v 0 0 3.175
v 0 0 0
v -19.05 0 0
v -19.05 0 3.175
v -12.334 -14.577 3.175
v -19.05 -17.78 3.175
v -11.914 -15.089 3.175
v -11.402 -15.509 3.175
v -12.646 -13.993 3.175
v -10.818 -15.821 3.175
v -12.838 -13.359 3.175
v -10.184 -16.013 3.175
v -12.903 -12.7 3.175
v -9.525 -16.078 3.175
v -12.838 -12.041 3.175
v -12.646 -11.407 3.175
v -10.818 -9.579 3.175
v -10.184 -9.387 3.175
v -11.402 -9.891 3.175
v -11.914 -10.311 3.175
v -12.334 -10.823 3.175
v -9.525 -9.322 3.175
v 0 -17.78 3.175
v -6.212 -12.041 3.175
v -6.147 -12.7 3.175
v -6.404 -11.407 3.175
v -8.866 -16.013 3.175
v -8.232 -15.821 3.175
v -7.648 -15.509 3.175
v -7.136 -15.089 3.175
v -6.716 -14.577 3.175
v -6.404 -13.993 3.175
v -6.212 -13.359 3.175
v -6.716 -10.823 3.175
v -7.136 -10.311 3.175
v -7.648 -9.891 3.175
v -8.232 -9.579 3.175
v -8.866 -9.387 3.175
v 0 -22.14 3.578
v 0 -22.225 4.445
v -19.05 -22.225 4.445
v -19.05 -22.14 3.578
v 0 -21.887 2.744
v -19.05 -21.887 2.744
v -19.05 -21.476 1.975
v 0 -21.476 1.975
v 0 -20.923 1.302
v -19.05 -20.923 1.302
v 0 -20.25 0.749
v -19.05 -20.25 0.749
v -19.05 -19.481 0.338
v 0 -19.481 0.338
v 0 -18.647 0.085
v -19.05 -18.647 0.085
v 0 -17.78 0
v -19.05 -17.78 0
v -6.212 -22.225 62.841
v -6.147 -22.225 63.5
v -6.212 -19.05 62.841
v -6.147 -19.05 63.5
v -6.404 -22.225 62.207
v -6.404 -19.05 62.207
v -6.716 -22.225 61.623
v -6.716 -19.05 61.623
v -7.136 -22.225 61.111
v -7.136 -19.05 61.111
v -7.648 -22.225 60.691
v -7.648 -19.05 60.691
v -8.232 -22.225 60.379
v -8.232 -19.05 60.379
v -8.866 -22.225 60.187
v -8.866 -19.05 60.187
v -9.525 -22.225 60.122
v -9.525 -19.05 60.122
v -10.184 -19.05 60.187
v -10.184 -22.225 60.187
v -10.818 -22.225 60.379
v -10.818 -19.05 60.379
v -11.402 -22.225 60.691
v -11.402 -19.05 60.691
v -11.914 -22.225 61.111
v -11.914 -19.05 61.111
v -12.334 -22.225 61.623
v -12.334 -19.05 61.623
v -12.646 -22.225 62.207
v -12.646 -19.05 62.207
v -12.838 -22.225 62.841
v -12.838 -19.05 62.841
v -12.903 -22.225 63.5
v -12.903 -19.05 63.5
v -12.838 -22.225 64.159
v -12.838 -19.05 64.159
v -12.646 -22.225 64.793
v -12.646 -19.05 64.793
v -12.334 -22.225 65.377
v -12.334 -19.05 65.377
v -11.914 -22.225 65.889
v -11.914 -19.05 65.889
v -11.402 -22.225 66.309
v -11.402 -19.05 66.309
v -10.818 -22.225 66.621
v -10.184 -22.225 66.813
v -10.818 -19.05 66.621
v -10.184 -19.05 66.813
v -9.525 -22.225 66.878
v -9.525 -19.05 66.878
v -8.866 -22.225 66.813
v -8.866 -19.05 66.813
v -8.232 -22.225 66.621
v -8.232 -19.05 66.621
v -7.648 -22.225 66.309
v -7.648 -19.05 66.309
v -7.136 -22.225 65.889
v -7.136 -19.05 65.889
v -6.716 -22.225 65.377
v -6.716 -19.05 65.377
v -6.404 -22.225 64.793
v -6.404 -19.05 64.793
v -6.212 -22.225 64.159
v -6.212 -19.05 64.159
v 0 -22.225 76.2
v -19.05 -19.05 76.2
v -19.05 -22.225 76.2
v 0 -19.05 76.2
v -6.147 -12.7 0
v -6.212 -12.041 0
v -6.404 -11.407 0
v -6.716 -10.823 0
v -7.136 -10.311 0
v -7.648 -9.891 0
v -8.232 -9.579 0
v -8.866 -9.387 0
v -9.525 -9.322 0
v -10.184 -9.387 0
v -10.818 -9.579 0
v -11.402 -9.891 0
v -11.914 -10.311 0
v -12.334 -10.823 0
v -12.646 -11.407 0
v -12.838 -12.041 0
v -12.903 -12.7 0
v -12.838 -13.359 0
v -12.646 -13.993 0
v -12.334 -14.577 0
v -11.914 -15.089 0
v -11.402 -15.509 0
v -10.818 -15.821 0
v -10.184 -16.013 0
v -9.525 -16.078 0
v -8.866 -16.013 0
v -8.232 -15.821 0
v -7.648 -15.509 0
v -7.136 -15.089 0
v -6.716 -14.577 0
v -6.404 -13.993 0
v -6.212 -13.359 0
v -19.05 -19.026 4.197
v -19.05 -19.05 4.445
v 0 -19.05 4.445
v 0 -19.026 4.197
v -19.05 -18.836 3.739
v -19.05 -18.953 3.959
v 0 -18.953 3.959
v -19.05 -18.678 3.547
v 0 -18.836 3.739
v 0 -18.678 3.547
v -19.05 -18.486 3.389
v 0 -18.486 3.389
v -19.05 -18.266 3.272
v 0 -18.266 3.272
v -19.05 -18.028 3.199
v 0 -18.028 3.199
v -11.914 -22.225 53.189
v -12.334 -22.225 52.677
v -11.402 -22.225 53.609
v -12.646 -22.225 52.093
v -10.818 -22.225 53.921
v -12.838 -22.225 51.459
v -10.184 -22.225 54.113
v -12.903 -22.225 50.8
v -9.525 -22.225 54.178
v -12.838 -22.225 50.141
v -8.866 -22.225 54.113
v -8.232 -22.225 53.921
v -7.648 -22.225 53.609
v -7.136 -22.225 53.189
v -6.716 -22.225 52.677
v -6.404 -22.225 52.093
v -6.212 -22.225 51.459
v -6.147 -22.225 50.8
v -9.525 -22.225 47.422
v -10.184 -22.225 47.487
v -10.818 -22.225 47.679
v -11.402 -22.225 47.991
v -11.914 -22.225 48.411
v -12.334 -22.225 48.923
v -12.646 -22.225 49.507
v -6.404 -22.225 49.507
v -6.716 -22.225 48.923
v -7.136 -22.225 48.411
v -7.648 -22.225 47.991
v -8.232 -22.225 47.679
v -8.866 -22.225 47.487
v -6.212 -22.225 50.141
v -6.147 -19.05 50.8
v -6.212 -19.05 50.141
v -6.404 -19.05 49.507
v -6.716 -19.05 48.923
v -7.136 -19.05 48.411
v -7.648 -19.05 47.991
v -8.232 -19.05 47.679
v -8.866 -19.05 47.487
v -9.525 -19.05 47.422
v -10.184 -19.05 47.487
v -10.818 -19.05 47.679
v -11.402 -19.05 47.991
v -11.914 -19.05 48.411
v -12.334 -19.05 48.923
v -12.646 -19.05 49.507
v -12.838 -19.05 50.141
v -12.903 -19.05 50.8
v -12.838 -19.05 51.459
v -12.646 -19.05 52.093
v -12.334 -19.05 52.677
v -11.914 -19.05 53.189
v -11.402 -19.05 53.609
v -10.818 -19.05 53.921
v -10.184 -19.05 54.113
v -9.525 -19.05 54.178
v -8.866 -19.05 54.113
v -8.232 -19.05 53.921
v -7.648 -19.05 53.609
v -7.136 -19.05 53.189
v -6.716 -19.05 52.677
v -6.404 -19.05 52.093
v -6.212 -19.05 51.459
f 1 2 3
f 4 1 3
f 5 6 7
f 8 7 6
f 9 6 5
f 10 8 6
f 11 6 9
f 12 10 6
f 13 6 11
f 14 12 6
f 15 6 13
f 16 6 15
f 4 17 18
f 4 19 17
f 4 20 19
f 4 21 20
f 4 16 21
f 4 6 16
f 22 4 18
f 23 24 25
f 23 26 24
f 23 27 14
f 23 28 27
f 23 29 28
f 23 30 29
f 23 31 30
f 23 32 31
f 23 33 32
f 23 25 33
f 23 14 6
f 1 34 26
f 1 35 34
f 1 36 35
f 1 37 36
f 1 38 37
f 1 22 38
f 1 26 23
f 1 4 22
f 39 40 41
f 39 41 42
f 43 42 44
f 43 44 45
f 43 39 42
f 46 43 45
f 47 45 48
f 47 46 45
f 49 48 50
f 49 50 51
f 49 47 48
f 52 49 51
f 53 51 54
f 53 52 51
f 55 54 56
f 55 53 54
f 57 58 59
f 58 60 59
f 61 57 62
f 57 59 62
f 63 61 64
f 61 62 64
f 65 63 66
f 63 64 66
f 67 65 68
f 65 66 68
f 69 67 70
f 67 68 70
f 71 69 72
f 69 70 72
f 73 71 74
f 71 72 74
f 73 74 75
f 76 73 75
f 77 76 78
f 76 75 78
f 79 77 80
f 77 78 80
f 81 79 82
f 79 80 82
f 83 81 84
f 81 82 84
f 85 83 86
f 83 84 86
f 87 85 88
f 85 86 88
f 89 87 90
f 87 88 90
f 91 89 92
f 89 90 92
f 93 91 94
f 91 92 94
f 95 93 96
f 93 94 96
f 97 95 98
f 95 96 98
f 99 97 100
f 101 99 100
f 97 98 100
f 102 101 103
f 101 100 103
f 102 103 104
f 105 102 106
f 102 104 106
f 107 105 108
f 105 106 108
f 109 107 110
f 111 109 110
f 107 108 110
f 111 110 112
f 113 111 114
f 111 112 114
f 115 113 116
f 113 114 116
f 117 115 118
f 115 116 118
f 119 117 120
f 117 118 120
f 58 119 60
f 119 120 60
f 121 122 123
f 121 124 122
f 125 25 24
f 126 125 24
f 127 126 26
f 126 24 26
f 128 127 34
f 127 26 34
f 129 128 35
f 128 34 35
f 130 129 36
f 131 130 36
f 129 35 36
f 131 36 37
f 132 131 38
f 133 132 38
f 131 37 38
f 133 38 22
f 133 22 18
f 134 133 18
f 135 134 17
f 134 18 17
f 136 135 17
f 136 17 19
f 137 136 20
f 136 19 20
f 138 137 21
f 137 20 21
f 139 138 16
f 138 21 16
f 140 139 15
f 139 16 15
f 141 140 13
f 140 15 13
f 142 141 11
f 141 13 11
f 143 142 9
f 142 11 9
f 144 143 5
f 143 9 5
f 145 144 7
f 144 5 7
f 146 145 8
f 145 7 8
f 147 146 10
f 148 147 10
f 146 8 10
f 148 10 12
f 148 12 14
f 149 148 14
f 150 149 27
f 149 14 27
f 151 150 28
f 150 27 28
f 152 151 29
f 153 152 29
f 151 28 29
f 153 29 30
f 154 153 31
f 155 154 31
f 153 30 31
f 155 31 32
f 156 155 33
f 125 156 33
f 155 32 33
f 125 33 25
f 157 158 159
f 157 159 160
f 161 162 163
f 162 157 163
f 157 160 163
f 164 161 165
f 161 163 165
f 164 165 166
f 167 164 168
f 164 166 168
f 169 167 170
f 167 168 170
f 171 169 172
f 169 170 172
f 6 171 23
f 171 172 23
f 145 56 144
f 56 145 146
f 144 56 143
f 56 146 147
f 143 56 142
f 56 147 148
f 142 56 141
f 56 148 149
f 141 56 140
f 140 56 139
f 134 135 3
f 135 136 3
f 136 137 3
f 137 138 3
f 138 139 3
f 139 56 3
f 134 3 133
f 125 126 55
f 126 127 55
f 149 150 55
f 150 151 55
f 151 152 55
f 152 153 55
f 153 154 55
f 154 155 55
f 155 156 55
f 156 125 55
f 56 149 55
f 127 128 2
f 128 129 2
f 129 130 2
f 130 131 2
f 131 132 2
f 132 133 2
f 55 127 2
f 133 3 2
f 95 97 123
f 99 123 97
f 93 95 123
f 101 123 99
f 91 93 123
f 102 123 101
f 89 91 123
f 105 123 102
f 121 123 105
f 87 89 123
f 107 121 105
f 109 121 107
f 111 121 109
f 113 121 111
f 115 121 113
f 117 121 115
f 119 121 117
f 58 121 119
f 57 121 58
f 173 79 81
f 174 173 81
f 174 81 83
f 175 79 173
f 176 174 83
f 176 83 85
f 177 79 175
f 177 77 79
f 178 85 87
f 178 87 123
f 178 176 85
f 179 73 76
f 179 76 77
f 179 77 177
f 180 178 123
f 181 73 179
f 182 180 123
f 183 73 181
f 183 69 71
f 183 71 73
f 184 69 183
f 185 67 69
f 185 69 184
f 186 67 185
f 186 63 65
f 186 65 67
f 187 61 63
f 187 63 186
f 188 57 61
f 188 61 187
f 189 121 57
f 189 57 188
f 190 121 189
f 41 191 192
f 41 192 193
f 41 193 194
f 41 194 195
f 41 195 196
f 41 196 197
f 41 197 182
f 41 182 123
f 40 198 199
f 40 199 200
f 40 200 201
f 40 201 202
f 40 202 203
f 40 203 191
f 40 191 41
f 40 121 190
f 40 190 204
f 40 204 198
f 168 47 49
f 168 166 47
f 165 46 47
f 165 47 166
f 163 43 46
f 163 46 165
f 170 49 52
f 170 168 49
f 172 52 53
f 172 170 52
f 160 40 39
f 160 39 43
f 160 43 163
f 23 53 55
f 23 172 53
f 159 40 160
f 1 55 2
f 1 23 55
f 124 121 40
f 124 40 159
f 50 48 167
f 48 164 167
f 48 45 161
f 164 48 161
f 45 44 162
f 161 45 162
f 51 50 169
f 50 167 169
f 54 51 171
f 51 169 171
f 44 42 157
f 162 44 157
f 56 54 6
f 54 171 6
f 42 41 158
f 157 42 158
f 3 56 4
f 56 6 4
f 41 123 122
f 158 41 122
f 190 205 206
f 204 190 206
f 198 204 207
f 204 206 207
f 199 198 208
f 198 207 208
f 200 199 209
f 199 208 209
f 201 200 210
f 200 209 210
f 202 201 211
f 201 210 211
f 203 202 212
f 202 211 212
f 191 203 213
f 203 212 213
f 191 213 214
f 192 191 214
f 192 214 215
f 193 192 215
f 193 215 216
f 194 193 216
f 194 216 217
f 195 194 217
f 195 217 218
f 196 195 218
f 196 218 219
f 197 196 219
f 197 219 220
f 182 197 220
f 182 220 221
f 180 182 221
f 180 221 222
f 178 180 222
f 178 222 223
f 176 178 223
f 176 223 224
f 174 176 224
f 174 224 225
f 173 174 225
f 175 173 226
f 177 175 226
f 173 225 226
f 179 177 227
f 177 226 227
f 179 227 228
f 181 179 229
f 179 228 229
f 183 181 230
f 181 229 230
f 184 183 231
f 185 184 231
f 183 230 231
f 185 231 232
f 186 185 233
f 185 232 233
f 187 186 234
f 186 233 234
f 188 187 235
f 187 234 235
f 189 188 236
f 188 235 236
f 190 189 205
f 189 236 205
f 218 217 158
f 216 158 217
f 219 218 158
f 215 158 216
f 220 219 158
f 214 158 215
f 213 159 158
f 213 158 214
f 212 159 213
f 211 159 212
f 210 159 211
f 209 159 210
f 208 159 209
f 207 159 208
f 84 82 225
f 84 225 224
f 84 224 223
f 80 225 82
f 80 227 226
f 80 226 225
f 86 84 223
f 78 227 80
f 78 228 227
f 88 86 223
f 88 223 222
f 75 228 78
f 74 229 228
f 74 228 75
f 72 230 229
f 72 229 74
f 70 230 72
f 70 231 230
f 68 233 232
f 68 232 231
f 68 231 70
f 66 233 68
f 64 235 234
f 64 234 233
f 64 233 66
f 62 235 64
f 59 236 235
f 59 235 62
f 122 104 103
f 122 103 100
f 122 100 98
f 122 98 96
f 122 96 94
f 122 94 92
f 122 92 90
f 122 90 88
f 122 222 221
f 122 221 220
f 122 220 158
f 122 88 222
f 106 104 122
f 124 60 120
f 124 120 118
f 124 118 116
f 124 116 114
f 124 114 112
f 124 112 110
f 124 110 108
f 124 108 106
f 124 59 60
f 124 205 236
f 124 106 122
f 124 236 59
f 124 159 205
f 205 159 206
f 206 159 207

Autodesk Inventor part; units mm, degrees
ref_plane "YZ Plane" through (0, 0, 0) normal (1, 0, 0) x (0, 1, 0)
ref_plane "XZ Plane" through (0, 0, 0) normal (0, 1, 0) x (-1, 0, 0)
ref_plane "XY Plane" through (0, 0, 0) normal (0, 0, 1) x (1, 0, 0)
sketch "Sketch1" plane through (0, 0, 0) normal (0, 0, 1) x (1, 0, 0)
  line L0 (0, 0) -> (0, -22.225)
  line L1 (0, 0) -> (-19.05, 0)
  line L2 (-19.05, 0) -> (-19.05, -22.225)
  line L3 (-19.05, -22.225) -> (0, -22.225)
  dimension "d0" = 22.225
  dimension "d1" = 19.05
extrude "Plate1" add sketch "Sketch1" along normal blind 3.175
sketch "Sketch2" plane through (0, -19.05, 0) normal (0, -1, 0) x (1, 0, 0)
  line L0 (-19.05, 0) -> (0, 0)
  line L1 (0, 0) -> (0, 76.2)
  line L2 (0, 76.2) -> (-19.05, 76.2)
  line L3 (-19.05, 76.2) -> (-19.05, 0)
edge flange "Flange1" height 76.2 angle 90 thickness 3.175 bend radius 1.27 thickness toward (0, -1, 0) relief straight relief width 3.175 relief depth 1.5875 edges at (-9.525, -22.225, 3.175) wall of the first edge with corners at (-19.05, -19.05, 0) (0, -19.05, 0) (0, -19.05, 76.2) (-19.05, -19.05, 76.2)
bend "Bend1"
corner "Corner1"
sketch "Sketch3" plane through (0, 0, 3.175) normal (0, 0, 1) x (1, 0, 0)
  circle A0 centre (90.7515, -113.3098) radius 3.3782 projected
  circle A1 centre (90.7515, -113.3098) radius 3.3782 projected
  circle A2 centre (-9.525, -12.7) radius 3.3782 projected
extrude "Cut1" cut sketch "Sketch3" against normal blind 3.175 contours A2
sketch "Sketch4" plane through (-19.05, -19.05, 76.2) normal (0, 1, 0) x (1, 0, 0)
  line L0 (0, 0) -> (19.05, 0) projected
  line L1 (19.05, 0) -> (19.05, 71.755) projected
  line L2 (9.525, 0) -> (9.525, 12.7)
  circle A0 centre (9.525, 12.7) radius 3.3782
  line L3 (9.525, 12.7) -> (9.525, 25.4)
  circle A1 centre (9.525, 25.4) radius 3.3782
  point P0 (19.05, 76.2)
  dimension "d15" = 12.7
  dimension "d16" = 6.7564
  dimension "d17" = 12.7
  dimension "d18" = 6.7564
extrude "Cut2" cut sketch "Sketch4" against normal blind 3.175
equation "\"d13\" = Thickness"
equation "\"d19\" = Thickness"
equation "\"d3\" = BendReliefWidth"
equation "\"d4\" = BendReliefDepth"
equation "\"d5\" = MinimumRemnant"
equation "\"d6\" = BendRadius"
equation "\"d10\" = CornerReliefSize"
equation "\"d11\" = GapSize"
equation "\"d12\" = JacobiRadiusSize"
equation "\"BendRadius\" = Thickness"
equation "\"BendReliefWidth\" = Thickness"
equation "\"BendReliefDepth\" = 0.5 * Thickness"
equation "\"CornerReliefSize\" = 4 * Thickness"
equation "\"MinimumRemnant\" = 2 * Thickness"
equation "\"TransitionRadius\" = BendRadius"
equation "\"JacobiRadiusSize\" = Thickness"
equation "\"GapSize\" = Thickness"
equation "\"d2\" = BendRadius"
equation "\"Thickness\" = 3.175"
properties part number "pawl mount reinforcement"
